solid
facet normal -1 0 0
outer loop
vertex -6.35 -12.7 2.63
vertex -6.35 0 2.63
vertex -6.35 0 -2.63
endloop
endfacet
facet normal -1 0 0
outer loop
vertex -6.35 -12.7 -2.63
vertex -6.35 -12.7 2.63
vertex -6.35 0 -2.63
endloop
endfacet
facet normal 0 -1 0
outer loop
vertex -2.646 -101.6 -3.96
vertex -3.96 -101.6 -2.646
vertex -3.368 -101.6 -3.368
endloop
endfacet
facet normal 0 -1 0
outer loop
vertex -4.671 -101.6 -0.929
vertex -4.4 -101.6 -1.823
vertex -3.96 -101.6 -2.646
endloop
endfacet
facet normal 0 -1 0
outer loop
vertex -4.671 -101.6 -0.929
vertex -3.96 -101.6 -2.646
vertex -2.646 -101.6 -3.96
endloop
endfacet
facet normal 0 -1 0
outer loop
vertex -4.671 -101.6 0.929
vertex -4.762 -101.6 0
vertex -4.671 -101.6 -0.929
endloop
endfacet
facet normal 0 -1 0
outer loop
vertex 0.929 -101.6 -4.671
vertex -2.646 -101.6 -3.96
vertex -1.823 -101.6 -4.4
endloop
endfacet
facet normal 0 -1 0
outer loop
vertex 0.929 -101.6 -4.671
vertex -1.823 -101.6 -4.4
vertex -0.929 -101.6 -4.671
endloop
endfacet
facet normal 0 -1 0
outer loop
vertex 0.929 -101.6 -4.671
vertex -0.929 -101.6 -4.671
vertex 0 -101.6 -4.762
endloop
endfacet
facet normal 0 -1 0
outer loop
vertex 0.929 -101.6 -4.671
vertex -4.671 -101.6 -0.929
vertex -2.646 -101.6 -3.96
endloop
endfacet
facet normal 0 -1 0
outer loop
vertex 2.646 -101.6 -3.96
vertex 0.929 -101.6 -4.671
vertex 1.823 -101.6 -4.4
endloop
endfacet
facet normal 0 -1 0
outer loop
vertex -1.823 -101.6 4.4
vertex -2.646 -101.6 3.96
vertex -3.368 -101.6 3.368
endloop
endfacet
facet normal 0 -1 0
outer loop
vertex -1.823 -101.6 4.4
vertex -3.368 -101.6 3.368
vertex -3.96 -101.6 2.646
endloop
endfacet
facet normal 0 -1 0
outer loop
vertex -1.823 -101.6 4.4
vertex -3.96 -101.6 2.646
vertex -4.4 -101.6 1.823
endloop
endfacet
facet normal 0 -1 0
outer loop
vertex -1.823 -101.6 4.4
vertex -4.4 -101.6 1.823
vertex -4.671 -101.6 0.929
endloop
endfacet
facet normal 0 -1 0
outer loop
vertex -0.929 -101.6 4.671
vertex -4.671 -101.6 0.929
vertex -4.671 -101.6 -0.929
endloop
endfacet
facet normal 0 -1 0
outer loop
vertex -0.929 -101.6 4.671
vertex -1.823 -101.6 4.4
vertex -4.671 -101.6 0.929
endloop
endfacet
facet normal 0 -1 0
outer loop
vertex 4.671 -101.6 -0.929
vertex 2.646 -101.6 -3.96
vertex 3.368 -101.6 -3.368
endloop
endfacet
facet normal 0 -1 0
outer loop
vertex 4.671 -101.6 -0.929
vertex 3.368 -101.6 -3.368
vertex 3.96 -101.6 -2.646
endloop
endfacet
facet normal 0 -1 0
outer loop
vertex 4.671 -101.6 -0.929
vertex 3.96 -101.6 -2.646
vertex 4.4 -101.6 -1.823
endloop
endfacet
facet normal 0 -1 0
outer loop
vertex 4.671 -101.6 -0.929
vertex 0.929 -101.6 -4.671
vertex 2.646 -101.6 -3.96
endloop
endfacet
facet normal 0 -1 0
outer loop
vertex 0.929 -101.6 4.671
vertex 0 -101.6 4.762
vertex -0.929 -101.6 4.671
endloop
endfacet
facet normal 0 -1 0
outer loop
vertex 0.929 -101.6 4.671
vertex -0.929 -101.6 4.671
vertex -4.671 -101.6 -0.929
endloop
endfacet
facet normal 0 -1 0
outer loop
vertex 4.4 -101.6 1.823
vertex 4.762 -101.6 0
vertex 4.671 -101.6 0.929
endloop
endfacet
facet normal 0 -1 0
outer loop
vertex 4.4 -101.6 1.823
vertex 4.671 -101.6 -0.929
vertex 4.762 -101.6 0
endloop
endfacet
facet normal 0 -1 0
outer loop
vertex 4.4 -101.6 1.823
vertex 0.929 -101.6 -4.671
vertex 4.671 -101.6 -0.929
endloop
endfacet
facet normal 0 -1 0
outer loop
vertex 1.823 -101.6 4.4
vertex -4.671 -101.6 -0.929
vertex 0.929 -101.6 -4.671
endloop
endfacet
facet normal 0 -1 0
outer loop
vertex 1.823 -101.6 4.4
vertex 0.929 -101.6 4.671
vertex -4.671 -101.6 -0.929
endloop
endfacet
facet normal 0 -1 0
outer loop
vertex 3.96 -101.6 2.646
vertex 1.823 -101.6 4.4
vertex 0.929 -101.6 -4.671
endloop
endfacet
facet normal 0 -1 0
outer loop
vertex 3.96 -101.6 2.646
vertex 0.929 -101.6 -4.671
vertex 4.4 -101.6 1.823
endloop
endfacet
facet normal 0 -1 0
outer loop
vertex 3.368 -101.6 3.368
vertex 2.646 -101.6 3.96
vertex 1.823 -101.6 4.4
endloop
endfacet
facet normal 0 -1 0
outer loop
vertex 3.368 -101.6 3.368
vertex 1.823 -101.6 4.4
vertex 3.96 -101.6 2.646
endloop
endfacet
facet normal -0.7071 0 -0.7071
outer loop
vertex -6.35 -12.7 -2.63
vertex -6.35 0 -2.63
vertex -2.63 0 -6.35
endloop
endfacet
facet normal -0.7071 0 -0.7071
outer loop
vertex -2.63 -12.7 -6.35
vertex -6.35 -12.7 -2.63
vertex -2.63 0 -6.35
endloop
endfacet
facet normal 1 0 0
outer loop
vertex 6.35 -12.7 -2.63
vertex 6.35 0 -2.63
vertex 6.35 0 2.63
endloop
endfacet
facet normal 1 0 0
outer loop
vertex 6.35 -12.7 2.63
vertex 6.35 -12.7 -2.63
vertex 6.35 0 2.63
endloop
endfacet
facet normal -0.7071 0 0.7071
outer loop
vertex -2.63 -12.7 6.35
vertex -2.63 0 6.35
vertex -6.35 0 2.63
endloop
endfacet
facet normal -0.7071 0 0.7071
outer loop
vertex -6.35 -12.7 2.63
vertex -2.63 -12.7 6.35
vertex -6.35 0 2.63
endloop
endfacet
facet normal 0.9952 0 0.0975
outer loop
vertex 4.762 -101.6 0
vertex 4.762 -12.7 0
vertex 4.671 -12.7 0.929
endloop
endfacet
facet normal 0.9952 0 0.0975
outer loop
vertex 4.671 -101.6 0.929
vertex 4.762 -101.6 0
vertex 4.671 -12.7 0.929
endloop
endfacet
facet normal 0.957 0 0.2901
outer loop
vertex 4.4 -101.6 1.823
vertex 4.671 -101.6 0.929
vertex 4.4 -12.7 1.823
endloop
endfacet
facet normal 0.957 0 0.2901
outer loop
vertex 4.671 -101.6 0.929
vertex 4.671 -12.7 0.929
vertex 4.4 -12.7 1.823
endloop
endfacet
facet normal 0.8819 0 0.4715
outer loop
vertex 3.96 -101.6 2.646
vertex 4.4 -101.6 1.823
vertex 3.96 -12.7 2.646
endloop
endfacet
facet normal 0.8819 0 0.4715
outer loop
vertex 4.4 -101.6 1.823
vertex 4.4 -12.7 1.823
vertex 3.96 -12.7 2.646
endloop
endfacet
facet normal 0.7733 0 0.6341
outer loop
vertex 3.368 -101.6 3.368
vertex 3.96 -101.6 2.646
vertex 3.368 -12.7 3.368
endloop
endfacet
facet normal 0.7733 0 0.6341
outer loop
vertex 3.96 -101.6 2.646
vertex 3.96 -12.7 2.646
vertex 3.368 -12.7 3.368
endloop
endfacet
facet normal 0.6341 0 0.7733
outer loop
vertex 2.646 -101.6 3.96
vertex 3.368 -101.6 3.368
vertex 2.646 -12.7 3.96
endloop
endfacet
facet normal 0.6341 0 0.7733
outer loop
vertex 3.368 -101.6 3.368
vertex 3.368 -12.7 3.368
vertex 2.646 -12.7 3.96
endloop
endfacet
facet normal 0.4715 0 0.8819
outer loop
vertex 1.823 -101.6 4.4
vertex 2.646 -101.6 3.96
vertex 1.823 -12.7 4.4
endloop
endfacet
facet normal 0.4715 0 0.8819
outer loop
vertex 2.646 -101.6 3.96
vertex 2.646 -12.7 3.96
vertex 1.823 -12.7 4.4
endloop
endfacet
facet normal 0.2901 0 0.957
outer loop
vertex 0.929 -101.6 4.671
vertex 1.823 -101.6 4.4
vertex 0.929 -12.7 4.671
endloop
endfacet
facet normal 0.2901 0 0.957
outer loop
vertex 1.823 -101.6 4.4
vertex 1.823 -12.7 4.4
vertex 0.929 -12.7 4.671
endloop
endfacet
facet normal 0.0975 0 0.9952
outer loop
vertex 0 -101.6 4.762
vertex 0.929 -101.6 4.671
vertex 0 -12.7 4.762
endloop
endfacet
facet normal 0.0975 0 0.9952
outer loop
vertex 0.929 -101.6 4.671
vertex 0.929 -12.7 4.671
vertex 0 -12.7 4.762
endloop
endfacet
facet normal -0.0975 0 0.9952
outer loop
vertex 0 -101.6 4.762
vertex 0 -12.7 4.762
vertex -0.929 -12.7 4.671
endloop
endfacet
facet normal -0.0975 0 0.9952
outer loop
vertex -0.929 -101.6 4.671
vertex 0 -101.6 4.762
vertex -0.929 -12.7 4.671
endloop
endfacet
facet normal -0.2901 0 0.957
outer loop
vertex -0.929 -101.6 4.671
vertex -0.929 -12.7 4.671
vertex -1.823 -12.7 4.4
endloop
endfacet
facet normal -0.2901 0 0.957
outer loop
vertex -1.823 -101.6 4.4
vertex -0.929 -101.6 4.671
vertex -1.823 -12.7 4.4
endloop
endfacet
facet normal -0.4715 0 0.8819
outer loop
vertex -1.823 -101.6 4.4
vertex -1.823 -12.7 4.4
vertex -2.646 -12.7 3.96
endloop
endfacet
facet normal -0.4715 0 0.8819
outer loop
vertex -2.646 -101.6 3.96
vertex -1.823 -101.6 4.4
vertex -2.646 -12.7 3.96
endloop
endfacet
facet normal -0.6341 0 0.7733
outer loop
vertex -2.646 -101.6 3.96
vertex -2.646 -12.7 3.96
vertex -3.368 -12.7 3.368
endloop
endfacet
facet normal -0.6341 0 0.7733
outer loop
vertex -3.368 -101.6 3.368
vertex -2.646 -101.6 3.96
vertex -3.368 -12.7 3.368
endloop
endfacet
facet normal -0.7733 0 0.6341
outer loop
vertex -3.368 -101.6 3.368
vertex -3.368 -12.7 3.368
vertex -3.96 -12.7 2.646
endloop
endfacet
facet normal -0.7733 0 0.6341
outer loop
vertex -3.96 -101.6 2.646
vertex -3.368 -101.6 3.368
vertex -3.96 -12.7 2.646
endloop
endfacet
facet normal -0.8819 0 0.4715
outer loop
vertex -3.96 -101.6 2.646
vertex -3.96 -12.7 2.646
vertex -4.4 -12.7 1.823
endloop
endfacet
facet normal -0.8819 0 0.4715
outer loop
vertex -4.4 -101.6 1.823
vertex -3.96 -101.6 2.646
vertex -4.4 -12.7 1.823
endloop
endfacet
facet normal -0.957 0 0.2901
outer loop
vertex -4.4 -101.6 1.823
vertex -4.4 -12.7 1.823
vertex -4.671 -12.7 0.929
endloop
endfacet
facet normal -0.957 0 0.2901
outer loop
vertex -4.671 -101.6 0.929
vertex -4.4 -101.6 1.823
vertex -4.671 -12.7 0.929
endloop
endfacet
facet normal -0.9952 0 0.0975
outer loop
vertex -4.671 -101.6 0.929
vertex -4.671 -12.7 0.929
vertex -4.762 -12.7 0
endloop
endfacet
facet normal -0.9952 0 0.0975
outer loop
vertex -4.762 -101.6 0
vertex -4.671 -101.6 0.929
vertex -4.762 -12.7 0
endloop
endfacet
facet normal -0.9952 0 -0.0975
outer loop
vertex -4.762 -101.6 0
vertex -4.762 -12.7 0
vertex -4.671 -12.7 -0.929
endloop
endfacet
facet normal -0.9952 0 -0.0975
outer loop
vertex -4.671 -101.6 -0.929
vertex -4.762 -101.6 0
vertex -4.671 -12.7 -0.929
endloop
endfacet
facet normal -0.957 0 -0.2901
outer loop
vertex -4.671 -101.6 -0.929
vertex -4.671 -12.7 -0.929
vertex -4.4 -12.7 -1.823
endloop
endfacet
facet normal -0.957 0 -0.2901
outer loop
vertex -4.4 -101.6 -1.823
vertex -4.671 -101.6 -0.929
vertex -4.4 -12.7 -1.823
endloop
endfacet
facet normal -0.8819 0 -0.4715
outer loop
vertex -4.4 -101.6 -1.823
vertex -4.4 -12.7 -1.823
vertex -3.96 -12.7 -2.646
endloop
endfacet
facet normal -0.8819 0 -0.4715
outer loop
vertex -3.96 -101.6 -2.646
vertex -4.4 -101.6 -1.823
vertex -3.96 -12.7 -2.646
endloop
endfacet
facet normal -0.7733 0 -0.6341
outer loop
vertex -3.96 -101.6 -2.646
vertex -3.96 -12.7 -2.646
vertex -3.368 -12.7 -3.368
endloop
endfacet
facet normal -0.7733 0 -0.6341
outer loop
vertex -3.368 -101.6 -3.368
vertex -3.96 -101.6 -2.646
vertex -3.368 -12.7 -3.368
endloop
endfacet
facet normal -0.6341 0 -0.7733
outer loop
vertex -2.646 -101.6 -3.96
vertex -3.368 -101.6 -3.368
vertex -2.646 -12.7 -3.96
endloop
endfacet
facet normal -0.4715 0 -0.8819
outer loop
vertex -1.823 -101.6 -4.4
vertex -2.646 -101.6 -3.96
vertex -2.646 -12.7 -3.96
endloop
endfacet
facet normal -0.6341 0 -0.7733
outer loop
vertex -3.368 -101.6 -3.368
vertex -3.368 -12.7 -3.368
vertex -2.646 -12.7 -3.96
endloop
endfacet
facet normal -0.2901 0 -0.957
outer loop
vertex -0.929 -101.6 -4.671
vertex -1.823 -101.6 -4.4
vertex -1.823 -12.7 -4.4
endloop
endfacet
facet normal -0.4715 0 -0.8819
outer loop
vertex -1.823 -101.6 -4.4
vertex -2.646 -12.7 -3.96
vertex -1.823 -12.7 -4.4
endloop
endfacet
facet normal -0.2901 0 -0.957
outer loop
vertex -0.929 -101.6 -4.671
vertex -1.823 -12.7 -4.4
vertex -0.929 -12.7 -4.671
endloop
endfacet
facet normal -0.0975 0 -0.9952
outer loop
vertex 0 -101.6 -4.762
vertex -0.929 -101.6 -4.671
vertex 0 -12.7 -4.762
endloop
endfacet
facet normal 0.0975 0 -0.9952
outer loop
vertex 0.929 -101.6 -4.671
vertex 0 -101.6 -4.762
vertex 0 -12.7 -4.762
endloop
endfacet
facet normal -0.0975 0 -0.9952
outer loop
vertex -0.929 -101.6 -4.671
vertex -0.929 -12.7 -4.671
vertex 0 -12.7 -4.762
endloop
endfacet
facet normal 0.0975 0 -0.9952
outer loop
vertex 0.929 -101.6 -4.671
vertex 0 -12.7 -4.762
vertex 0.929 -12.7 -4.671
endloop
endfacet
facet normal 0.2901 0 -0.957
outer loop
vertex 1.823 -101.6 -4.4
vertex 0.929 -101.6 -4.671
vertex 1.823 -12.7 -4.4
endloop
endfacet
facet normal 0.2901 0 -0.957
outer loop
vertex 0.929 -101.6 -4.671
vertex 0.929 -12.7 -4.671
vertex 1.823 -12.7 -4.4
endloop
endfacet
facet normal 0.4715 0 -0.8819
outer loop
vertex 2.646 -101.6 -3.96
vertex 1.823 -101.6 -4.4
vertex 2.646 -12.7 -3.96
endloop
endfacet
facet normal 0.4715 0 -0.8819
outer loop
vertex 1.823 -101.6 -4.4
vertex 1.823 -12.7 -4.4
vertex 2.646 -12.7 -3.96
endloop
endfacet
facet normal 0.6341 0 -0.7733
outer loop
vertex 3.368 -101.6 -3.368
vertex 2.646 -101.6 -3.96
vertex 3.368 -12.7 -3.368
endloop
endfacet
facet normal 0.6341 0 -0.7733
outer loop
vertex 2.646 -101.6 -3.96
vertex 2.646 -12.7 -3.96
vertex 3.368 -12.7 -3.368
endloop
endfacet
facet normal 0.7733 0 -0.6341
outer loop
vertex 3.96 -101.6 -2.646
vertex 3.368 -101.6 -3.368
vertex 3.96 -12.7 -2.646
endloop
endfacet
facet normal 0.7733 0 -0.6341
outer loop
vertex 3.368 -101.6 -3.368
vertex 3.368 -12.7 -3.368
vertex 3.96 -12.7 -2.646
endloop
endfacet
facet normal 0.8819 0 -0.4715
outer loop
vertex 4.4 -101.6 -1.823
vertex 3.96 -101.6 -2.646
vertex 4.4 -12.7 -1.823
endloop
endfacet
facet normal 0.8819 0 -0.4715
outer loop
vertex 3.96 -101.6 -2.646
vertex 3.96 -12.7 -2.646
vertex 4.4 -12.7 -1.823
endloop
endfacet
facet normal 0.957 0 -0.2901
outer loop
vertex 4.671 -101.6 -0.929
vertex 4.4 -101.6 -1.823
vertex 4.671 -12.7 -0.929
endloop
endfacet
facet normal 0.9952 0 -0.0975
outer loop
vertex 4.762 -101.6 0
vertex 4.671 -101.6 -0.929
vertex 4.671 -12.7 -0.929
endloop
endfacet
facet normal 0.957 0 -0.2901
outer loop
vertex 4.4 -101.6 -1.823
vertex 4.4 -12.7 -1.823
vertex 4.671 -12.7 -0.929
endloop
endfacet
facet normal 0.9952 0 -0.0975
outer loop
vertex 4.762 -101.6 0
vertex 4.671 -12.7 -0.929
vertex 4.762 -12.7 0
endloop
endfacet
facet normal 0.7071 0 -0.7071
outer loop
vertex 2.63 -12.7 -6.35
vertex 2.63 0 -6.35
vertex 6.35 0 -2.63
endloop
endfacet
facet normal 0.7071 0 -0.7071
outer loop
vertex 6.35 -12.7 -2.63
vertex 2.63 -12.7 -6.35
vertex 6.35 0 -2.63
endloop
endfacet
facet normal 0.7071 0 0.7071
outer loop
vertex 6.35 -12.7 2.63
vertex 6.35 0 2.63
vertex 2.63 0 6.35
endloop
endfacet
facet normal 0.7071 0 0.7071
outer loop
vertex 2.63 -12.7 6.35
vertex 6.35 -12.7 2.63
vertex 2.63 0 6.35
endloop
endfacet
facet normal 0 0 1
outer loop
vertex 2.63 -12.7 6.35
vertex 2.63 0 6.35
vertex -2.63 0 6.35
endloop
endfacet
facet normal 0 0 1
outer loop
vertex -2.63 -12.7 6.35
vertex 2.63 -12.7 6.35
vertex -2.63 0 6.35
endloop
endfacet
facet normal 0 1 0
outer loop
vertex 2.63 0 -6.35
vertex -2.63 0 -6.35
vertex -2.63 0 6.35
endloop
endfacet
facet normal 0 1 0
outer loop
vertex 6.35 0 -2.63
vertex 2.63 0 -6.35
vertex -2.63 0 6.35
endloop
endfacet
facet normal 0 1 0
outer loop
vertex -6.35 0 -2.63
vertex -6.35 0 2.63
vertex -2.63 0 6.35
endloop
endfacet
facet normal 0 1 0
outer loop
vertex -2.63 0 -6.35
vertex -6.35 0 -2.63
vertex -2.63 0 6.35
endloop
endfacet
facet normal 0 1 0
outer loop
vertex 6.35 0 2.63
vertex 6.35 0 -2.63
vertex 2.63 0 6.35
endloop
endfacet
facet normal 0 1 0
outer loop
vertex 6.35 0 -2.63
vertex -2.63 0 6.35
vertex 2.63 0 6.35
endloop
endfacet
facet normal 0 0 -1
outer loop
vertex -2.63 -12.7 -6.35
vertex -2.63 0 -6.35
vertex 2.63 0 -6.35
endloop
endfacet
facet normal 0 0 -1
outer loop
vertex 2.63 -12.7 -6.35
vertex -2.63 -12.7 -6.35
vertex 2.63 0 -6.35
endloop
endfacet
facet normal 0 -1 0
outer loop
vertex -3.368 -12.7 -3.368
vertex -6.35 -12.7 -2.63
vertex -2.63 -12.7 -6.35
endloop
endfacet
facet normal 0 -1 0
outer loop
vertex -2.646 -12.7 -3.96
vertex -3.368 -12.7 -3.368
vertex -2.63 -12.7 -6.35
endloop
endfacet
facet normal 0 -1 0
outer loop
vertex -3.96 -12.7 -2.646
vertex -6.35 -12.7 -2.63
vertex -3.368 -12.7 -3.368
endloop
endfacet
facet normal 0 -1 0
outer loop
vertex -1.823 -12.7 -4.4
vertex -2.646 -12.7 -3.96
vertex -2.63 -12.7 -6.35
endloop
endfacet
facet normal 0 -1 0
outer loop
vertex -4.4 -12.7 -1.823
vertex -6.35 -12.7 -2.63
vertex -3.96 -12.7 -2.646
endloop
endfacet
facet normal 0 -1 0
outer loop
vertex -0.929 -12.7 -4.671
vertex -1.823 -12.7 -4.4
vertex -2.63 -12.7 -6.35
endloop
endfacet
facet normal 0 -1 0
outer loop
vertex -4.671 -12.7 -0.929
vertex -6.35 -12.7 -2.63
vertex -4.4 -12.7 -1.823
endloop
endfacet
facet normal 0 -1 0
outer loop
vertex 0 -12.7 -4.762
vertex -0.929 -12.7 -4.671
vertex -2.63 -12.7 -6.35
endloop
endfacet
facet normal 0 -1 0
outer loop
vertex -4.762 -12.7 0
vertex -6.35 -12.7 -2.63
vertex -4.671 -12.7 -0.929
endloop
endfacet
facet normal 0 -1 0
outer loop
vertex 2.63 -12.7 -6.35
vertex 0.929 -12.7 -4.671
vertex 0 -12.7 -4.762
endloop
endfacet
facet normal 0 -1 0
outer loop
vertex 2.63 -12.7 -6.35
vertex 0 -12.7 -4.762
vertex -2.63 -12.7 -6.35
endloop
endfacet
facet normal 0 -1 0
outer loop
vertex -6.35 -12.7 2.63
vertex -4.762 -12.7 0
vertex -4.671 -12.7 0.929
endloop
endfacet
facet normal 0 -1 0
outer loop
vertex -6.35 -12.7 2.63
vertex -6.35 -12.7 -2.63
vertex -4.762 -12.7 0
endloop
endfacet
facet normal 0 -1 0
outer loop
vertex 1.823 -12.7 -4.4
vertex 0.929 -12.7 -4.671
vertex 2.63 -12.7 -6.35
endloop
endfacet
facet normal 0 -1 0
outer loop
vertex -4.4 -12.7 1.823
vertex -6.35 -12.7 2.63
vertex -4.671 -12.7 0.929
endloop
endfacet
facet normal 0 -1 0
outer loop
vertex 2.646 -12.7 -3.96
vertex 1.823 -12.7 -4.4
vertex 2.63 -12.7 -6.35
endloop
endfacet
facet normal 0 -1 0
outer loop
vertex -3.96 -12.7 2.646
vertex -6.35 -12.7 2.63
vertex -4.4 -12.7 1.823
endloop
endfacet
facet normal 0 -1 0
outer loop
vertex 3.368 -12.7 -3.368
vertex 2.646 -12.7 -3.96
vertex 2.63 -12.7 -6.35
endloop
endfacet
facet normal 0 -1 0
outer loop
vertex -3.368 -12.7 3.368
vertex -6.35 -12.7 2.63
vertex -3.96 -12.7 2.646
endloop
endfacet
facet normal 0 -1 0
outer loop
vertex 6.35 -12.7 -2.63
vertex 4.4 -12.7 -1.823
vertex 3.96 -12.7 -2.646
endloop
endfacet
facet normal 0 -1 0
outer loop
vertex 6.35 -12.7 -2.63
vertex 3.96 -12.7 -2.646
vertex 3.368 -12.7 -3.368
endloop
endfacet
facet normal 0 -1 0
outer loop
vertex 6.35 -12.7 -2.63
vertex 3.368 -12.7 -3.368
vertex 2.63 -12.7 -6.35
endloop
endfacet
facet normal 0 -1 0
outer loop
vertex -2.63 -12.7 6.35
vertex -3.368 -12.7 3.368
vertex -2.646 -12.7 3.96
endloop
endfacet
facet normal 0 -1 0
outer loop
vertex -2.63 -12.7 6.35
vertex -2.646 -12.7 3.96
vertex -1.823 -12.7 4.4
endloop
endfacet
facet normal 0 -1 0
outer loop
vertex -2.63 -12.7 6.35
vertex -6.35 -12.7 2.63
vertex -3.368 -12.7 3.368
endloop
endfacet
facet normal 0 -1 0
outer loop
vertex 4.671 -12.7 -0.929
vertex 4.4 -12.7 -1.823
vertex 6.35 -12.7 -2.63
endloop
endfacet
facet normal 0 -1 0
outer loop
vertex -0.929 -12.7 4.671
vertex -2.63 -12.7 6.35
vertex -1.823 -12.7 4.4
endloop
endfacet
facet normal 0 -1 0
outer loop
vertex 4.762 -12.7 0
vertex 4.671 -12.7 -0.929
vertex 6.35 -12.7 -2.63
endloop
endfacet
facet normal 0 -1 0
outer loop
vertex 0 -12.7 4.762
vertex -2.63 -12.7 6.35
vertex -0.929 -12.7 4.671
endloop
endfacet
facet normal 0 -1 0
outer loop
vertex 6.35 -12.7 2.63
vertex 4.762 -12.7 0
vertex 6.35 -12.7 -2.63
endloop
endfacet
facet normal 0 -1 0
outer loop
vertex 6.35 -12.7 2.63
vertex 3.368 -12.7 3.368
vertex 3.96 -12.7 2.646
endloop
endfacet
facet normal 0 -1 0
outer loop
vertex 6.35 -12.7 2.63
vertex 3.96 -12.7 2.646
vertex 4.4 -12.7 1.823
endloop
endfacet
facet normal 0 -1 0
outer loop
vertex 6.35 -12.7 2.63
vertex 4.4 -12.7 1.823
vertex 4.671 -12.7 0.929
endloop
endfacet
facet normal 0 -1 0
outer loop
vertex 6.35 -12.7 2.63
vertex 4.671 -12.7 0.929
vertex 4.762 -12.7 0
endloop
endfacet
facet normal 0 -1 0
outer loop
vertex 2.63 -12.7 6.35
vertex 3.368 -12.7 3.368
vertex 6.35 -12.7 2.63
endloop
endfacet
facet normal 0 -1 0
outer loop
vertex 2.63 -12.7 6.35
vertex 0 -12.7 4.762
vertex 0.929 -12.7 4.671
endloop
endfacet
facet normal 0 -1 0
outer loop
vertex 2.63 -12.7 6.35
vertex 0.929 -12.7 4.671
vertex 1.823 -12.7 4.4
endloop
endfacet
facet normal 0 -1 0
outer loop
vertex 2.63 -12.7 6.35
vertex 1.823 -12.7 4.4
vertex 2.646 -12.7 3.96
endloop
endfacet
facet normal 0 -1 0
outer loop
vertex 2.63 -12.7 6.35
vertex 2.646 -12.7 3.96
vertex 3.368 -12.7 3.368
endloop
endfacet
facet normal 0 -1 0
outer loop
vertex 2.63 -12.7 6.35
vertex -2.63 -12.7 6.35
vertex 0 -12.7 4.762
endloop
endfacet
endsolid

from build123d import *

# Parameters (mm, degrees)
F0_R     = 4.7625
F1_DEPTH = 101.6
F3_DEPTH = 12.7


with BuildPart() as f1:
    # F0 (on Front) → F1 (new body)
    with BuildSketch(Plane.XZ):
        Circle(F0_R)
    extrude(amount=F1_DEPTH)

    # F2 (on Front) → F3 (join)
    with BuildSketch(Plane.XZ):
        Polygon((-2.630256, -6.35), (2.630256, -6.35), (6.35, -2.630256), (6.35, 2.630256), (2.630256, 6.35), (-2.630256, 6.35), (-6.35, 2.630256), (-6.35, -2.630256), align=None)
    extrude(amount=F3_DEPTH)


solid = f1.part
